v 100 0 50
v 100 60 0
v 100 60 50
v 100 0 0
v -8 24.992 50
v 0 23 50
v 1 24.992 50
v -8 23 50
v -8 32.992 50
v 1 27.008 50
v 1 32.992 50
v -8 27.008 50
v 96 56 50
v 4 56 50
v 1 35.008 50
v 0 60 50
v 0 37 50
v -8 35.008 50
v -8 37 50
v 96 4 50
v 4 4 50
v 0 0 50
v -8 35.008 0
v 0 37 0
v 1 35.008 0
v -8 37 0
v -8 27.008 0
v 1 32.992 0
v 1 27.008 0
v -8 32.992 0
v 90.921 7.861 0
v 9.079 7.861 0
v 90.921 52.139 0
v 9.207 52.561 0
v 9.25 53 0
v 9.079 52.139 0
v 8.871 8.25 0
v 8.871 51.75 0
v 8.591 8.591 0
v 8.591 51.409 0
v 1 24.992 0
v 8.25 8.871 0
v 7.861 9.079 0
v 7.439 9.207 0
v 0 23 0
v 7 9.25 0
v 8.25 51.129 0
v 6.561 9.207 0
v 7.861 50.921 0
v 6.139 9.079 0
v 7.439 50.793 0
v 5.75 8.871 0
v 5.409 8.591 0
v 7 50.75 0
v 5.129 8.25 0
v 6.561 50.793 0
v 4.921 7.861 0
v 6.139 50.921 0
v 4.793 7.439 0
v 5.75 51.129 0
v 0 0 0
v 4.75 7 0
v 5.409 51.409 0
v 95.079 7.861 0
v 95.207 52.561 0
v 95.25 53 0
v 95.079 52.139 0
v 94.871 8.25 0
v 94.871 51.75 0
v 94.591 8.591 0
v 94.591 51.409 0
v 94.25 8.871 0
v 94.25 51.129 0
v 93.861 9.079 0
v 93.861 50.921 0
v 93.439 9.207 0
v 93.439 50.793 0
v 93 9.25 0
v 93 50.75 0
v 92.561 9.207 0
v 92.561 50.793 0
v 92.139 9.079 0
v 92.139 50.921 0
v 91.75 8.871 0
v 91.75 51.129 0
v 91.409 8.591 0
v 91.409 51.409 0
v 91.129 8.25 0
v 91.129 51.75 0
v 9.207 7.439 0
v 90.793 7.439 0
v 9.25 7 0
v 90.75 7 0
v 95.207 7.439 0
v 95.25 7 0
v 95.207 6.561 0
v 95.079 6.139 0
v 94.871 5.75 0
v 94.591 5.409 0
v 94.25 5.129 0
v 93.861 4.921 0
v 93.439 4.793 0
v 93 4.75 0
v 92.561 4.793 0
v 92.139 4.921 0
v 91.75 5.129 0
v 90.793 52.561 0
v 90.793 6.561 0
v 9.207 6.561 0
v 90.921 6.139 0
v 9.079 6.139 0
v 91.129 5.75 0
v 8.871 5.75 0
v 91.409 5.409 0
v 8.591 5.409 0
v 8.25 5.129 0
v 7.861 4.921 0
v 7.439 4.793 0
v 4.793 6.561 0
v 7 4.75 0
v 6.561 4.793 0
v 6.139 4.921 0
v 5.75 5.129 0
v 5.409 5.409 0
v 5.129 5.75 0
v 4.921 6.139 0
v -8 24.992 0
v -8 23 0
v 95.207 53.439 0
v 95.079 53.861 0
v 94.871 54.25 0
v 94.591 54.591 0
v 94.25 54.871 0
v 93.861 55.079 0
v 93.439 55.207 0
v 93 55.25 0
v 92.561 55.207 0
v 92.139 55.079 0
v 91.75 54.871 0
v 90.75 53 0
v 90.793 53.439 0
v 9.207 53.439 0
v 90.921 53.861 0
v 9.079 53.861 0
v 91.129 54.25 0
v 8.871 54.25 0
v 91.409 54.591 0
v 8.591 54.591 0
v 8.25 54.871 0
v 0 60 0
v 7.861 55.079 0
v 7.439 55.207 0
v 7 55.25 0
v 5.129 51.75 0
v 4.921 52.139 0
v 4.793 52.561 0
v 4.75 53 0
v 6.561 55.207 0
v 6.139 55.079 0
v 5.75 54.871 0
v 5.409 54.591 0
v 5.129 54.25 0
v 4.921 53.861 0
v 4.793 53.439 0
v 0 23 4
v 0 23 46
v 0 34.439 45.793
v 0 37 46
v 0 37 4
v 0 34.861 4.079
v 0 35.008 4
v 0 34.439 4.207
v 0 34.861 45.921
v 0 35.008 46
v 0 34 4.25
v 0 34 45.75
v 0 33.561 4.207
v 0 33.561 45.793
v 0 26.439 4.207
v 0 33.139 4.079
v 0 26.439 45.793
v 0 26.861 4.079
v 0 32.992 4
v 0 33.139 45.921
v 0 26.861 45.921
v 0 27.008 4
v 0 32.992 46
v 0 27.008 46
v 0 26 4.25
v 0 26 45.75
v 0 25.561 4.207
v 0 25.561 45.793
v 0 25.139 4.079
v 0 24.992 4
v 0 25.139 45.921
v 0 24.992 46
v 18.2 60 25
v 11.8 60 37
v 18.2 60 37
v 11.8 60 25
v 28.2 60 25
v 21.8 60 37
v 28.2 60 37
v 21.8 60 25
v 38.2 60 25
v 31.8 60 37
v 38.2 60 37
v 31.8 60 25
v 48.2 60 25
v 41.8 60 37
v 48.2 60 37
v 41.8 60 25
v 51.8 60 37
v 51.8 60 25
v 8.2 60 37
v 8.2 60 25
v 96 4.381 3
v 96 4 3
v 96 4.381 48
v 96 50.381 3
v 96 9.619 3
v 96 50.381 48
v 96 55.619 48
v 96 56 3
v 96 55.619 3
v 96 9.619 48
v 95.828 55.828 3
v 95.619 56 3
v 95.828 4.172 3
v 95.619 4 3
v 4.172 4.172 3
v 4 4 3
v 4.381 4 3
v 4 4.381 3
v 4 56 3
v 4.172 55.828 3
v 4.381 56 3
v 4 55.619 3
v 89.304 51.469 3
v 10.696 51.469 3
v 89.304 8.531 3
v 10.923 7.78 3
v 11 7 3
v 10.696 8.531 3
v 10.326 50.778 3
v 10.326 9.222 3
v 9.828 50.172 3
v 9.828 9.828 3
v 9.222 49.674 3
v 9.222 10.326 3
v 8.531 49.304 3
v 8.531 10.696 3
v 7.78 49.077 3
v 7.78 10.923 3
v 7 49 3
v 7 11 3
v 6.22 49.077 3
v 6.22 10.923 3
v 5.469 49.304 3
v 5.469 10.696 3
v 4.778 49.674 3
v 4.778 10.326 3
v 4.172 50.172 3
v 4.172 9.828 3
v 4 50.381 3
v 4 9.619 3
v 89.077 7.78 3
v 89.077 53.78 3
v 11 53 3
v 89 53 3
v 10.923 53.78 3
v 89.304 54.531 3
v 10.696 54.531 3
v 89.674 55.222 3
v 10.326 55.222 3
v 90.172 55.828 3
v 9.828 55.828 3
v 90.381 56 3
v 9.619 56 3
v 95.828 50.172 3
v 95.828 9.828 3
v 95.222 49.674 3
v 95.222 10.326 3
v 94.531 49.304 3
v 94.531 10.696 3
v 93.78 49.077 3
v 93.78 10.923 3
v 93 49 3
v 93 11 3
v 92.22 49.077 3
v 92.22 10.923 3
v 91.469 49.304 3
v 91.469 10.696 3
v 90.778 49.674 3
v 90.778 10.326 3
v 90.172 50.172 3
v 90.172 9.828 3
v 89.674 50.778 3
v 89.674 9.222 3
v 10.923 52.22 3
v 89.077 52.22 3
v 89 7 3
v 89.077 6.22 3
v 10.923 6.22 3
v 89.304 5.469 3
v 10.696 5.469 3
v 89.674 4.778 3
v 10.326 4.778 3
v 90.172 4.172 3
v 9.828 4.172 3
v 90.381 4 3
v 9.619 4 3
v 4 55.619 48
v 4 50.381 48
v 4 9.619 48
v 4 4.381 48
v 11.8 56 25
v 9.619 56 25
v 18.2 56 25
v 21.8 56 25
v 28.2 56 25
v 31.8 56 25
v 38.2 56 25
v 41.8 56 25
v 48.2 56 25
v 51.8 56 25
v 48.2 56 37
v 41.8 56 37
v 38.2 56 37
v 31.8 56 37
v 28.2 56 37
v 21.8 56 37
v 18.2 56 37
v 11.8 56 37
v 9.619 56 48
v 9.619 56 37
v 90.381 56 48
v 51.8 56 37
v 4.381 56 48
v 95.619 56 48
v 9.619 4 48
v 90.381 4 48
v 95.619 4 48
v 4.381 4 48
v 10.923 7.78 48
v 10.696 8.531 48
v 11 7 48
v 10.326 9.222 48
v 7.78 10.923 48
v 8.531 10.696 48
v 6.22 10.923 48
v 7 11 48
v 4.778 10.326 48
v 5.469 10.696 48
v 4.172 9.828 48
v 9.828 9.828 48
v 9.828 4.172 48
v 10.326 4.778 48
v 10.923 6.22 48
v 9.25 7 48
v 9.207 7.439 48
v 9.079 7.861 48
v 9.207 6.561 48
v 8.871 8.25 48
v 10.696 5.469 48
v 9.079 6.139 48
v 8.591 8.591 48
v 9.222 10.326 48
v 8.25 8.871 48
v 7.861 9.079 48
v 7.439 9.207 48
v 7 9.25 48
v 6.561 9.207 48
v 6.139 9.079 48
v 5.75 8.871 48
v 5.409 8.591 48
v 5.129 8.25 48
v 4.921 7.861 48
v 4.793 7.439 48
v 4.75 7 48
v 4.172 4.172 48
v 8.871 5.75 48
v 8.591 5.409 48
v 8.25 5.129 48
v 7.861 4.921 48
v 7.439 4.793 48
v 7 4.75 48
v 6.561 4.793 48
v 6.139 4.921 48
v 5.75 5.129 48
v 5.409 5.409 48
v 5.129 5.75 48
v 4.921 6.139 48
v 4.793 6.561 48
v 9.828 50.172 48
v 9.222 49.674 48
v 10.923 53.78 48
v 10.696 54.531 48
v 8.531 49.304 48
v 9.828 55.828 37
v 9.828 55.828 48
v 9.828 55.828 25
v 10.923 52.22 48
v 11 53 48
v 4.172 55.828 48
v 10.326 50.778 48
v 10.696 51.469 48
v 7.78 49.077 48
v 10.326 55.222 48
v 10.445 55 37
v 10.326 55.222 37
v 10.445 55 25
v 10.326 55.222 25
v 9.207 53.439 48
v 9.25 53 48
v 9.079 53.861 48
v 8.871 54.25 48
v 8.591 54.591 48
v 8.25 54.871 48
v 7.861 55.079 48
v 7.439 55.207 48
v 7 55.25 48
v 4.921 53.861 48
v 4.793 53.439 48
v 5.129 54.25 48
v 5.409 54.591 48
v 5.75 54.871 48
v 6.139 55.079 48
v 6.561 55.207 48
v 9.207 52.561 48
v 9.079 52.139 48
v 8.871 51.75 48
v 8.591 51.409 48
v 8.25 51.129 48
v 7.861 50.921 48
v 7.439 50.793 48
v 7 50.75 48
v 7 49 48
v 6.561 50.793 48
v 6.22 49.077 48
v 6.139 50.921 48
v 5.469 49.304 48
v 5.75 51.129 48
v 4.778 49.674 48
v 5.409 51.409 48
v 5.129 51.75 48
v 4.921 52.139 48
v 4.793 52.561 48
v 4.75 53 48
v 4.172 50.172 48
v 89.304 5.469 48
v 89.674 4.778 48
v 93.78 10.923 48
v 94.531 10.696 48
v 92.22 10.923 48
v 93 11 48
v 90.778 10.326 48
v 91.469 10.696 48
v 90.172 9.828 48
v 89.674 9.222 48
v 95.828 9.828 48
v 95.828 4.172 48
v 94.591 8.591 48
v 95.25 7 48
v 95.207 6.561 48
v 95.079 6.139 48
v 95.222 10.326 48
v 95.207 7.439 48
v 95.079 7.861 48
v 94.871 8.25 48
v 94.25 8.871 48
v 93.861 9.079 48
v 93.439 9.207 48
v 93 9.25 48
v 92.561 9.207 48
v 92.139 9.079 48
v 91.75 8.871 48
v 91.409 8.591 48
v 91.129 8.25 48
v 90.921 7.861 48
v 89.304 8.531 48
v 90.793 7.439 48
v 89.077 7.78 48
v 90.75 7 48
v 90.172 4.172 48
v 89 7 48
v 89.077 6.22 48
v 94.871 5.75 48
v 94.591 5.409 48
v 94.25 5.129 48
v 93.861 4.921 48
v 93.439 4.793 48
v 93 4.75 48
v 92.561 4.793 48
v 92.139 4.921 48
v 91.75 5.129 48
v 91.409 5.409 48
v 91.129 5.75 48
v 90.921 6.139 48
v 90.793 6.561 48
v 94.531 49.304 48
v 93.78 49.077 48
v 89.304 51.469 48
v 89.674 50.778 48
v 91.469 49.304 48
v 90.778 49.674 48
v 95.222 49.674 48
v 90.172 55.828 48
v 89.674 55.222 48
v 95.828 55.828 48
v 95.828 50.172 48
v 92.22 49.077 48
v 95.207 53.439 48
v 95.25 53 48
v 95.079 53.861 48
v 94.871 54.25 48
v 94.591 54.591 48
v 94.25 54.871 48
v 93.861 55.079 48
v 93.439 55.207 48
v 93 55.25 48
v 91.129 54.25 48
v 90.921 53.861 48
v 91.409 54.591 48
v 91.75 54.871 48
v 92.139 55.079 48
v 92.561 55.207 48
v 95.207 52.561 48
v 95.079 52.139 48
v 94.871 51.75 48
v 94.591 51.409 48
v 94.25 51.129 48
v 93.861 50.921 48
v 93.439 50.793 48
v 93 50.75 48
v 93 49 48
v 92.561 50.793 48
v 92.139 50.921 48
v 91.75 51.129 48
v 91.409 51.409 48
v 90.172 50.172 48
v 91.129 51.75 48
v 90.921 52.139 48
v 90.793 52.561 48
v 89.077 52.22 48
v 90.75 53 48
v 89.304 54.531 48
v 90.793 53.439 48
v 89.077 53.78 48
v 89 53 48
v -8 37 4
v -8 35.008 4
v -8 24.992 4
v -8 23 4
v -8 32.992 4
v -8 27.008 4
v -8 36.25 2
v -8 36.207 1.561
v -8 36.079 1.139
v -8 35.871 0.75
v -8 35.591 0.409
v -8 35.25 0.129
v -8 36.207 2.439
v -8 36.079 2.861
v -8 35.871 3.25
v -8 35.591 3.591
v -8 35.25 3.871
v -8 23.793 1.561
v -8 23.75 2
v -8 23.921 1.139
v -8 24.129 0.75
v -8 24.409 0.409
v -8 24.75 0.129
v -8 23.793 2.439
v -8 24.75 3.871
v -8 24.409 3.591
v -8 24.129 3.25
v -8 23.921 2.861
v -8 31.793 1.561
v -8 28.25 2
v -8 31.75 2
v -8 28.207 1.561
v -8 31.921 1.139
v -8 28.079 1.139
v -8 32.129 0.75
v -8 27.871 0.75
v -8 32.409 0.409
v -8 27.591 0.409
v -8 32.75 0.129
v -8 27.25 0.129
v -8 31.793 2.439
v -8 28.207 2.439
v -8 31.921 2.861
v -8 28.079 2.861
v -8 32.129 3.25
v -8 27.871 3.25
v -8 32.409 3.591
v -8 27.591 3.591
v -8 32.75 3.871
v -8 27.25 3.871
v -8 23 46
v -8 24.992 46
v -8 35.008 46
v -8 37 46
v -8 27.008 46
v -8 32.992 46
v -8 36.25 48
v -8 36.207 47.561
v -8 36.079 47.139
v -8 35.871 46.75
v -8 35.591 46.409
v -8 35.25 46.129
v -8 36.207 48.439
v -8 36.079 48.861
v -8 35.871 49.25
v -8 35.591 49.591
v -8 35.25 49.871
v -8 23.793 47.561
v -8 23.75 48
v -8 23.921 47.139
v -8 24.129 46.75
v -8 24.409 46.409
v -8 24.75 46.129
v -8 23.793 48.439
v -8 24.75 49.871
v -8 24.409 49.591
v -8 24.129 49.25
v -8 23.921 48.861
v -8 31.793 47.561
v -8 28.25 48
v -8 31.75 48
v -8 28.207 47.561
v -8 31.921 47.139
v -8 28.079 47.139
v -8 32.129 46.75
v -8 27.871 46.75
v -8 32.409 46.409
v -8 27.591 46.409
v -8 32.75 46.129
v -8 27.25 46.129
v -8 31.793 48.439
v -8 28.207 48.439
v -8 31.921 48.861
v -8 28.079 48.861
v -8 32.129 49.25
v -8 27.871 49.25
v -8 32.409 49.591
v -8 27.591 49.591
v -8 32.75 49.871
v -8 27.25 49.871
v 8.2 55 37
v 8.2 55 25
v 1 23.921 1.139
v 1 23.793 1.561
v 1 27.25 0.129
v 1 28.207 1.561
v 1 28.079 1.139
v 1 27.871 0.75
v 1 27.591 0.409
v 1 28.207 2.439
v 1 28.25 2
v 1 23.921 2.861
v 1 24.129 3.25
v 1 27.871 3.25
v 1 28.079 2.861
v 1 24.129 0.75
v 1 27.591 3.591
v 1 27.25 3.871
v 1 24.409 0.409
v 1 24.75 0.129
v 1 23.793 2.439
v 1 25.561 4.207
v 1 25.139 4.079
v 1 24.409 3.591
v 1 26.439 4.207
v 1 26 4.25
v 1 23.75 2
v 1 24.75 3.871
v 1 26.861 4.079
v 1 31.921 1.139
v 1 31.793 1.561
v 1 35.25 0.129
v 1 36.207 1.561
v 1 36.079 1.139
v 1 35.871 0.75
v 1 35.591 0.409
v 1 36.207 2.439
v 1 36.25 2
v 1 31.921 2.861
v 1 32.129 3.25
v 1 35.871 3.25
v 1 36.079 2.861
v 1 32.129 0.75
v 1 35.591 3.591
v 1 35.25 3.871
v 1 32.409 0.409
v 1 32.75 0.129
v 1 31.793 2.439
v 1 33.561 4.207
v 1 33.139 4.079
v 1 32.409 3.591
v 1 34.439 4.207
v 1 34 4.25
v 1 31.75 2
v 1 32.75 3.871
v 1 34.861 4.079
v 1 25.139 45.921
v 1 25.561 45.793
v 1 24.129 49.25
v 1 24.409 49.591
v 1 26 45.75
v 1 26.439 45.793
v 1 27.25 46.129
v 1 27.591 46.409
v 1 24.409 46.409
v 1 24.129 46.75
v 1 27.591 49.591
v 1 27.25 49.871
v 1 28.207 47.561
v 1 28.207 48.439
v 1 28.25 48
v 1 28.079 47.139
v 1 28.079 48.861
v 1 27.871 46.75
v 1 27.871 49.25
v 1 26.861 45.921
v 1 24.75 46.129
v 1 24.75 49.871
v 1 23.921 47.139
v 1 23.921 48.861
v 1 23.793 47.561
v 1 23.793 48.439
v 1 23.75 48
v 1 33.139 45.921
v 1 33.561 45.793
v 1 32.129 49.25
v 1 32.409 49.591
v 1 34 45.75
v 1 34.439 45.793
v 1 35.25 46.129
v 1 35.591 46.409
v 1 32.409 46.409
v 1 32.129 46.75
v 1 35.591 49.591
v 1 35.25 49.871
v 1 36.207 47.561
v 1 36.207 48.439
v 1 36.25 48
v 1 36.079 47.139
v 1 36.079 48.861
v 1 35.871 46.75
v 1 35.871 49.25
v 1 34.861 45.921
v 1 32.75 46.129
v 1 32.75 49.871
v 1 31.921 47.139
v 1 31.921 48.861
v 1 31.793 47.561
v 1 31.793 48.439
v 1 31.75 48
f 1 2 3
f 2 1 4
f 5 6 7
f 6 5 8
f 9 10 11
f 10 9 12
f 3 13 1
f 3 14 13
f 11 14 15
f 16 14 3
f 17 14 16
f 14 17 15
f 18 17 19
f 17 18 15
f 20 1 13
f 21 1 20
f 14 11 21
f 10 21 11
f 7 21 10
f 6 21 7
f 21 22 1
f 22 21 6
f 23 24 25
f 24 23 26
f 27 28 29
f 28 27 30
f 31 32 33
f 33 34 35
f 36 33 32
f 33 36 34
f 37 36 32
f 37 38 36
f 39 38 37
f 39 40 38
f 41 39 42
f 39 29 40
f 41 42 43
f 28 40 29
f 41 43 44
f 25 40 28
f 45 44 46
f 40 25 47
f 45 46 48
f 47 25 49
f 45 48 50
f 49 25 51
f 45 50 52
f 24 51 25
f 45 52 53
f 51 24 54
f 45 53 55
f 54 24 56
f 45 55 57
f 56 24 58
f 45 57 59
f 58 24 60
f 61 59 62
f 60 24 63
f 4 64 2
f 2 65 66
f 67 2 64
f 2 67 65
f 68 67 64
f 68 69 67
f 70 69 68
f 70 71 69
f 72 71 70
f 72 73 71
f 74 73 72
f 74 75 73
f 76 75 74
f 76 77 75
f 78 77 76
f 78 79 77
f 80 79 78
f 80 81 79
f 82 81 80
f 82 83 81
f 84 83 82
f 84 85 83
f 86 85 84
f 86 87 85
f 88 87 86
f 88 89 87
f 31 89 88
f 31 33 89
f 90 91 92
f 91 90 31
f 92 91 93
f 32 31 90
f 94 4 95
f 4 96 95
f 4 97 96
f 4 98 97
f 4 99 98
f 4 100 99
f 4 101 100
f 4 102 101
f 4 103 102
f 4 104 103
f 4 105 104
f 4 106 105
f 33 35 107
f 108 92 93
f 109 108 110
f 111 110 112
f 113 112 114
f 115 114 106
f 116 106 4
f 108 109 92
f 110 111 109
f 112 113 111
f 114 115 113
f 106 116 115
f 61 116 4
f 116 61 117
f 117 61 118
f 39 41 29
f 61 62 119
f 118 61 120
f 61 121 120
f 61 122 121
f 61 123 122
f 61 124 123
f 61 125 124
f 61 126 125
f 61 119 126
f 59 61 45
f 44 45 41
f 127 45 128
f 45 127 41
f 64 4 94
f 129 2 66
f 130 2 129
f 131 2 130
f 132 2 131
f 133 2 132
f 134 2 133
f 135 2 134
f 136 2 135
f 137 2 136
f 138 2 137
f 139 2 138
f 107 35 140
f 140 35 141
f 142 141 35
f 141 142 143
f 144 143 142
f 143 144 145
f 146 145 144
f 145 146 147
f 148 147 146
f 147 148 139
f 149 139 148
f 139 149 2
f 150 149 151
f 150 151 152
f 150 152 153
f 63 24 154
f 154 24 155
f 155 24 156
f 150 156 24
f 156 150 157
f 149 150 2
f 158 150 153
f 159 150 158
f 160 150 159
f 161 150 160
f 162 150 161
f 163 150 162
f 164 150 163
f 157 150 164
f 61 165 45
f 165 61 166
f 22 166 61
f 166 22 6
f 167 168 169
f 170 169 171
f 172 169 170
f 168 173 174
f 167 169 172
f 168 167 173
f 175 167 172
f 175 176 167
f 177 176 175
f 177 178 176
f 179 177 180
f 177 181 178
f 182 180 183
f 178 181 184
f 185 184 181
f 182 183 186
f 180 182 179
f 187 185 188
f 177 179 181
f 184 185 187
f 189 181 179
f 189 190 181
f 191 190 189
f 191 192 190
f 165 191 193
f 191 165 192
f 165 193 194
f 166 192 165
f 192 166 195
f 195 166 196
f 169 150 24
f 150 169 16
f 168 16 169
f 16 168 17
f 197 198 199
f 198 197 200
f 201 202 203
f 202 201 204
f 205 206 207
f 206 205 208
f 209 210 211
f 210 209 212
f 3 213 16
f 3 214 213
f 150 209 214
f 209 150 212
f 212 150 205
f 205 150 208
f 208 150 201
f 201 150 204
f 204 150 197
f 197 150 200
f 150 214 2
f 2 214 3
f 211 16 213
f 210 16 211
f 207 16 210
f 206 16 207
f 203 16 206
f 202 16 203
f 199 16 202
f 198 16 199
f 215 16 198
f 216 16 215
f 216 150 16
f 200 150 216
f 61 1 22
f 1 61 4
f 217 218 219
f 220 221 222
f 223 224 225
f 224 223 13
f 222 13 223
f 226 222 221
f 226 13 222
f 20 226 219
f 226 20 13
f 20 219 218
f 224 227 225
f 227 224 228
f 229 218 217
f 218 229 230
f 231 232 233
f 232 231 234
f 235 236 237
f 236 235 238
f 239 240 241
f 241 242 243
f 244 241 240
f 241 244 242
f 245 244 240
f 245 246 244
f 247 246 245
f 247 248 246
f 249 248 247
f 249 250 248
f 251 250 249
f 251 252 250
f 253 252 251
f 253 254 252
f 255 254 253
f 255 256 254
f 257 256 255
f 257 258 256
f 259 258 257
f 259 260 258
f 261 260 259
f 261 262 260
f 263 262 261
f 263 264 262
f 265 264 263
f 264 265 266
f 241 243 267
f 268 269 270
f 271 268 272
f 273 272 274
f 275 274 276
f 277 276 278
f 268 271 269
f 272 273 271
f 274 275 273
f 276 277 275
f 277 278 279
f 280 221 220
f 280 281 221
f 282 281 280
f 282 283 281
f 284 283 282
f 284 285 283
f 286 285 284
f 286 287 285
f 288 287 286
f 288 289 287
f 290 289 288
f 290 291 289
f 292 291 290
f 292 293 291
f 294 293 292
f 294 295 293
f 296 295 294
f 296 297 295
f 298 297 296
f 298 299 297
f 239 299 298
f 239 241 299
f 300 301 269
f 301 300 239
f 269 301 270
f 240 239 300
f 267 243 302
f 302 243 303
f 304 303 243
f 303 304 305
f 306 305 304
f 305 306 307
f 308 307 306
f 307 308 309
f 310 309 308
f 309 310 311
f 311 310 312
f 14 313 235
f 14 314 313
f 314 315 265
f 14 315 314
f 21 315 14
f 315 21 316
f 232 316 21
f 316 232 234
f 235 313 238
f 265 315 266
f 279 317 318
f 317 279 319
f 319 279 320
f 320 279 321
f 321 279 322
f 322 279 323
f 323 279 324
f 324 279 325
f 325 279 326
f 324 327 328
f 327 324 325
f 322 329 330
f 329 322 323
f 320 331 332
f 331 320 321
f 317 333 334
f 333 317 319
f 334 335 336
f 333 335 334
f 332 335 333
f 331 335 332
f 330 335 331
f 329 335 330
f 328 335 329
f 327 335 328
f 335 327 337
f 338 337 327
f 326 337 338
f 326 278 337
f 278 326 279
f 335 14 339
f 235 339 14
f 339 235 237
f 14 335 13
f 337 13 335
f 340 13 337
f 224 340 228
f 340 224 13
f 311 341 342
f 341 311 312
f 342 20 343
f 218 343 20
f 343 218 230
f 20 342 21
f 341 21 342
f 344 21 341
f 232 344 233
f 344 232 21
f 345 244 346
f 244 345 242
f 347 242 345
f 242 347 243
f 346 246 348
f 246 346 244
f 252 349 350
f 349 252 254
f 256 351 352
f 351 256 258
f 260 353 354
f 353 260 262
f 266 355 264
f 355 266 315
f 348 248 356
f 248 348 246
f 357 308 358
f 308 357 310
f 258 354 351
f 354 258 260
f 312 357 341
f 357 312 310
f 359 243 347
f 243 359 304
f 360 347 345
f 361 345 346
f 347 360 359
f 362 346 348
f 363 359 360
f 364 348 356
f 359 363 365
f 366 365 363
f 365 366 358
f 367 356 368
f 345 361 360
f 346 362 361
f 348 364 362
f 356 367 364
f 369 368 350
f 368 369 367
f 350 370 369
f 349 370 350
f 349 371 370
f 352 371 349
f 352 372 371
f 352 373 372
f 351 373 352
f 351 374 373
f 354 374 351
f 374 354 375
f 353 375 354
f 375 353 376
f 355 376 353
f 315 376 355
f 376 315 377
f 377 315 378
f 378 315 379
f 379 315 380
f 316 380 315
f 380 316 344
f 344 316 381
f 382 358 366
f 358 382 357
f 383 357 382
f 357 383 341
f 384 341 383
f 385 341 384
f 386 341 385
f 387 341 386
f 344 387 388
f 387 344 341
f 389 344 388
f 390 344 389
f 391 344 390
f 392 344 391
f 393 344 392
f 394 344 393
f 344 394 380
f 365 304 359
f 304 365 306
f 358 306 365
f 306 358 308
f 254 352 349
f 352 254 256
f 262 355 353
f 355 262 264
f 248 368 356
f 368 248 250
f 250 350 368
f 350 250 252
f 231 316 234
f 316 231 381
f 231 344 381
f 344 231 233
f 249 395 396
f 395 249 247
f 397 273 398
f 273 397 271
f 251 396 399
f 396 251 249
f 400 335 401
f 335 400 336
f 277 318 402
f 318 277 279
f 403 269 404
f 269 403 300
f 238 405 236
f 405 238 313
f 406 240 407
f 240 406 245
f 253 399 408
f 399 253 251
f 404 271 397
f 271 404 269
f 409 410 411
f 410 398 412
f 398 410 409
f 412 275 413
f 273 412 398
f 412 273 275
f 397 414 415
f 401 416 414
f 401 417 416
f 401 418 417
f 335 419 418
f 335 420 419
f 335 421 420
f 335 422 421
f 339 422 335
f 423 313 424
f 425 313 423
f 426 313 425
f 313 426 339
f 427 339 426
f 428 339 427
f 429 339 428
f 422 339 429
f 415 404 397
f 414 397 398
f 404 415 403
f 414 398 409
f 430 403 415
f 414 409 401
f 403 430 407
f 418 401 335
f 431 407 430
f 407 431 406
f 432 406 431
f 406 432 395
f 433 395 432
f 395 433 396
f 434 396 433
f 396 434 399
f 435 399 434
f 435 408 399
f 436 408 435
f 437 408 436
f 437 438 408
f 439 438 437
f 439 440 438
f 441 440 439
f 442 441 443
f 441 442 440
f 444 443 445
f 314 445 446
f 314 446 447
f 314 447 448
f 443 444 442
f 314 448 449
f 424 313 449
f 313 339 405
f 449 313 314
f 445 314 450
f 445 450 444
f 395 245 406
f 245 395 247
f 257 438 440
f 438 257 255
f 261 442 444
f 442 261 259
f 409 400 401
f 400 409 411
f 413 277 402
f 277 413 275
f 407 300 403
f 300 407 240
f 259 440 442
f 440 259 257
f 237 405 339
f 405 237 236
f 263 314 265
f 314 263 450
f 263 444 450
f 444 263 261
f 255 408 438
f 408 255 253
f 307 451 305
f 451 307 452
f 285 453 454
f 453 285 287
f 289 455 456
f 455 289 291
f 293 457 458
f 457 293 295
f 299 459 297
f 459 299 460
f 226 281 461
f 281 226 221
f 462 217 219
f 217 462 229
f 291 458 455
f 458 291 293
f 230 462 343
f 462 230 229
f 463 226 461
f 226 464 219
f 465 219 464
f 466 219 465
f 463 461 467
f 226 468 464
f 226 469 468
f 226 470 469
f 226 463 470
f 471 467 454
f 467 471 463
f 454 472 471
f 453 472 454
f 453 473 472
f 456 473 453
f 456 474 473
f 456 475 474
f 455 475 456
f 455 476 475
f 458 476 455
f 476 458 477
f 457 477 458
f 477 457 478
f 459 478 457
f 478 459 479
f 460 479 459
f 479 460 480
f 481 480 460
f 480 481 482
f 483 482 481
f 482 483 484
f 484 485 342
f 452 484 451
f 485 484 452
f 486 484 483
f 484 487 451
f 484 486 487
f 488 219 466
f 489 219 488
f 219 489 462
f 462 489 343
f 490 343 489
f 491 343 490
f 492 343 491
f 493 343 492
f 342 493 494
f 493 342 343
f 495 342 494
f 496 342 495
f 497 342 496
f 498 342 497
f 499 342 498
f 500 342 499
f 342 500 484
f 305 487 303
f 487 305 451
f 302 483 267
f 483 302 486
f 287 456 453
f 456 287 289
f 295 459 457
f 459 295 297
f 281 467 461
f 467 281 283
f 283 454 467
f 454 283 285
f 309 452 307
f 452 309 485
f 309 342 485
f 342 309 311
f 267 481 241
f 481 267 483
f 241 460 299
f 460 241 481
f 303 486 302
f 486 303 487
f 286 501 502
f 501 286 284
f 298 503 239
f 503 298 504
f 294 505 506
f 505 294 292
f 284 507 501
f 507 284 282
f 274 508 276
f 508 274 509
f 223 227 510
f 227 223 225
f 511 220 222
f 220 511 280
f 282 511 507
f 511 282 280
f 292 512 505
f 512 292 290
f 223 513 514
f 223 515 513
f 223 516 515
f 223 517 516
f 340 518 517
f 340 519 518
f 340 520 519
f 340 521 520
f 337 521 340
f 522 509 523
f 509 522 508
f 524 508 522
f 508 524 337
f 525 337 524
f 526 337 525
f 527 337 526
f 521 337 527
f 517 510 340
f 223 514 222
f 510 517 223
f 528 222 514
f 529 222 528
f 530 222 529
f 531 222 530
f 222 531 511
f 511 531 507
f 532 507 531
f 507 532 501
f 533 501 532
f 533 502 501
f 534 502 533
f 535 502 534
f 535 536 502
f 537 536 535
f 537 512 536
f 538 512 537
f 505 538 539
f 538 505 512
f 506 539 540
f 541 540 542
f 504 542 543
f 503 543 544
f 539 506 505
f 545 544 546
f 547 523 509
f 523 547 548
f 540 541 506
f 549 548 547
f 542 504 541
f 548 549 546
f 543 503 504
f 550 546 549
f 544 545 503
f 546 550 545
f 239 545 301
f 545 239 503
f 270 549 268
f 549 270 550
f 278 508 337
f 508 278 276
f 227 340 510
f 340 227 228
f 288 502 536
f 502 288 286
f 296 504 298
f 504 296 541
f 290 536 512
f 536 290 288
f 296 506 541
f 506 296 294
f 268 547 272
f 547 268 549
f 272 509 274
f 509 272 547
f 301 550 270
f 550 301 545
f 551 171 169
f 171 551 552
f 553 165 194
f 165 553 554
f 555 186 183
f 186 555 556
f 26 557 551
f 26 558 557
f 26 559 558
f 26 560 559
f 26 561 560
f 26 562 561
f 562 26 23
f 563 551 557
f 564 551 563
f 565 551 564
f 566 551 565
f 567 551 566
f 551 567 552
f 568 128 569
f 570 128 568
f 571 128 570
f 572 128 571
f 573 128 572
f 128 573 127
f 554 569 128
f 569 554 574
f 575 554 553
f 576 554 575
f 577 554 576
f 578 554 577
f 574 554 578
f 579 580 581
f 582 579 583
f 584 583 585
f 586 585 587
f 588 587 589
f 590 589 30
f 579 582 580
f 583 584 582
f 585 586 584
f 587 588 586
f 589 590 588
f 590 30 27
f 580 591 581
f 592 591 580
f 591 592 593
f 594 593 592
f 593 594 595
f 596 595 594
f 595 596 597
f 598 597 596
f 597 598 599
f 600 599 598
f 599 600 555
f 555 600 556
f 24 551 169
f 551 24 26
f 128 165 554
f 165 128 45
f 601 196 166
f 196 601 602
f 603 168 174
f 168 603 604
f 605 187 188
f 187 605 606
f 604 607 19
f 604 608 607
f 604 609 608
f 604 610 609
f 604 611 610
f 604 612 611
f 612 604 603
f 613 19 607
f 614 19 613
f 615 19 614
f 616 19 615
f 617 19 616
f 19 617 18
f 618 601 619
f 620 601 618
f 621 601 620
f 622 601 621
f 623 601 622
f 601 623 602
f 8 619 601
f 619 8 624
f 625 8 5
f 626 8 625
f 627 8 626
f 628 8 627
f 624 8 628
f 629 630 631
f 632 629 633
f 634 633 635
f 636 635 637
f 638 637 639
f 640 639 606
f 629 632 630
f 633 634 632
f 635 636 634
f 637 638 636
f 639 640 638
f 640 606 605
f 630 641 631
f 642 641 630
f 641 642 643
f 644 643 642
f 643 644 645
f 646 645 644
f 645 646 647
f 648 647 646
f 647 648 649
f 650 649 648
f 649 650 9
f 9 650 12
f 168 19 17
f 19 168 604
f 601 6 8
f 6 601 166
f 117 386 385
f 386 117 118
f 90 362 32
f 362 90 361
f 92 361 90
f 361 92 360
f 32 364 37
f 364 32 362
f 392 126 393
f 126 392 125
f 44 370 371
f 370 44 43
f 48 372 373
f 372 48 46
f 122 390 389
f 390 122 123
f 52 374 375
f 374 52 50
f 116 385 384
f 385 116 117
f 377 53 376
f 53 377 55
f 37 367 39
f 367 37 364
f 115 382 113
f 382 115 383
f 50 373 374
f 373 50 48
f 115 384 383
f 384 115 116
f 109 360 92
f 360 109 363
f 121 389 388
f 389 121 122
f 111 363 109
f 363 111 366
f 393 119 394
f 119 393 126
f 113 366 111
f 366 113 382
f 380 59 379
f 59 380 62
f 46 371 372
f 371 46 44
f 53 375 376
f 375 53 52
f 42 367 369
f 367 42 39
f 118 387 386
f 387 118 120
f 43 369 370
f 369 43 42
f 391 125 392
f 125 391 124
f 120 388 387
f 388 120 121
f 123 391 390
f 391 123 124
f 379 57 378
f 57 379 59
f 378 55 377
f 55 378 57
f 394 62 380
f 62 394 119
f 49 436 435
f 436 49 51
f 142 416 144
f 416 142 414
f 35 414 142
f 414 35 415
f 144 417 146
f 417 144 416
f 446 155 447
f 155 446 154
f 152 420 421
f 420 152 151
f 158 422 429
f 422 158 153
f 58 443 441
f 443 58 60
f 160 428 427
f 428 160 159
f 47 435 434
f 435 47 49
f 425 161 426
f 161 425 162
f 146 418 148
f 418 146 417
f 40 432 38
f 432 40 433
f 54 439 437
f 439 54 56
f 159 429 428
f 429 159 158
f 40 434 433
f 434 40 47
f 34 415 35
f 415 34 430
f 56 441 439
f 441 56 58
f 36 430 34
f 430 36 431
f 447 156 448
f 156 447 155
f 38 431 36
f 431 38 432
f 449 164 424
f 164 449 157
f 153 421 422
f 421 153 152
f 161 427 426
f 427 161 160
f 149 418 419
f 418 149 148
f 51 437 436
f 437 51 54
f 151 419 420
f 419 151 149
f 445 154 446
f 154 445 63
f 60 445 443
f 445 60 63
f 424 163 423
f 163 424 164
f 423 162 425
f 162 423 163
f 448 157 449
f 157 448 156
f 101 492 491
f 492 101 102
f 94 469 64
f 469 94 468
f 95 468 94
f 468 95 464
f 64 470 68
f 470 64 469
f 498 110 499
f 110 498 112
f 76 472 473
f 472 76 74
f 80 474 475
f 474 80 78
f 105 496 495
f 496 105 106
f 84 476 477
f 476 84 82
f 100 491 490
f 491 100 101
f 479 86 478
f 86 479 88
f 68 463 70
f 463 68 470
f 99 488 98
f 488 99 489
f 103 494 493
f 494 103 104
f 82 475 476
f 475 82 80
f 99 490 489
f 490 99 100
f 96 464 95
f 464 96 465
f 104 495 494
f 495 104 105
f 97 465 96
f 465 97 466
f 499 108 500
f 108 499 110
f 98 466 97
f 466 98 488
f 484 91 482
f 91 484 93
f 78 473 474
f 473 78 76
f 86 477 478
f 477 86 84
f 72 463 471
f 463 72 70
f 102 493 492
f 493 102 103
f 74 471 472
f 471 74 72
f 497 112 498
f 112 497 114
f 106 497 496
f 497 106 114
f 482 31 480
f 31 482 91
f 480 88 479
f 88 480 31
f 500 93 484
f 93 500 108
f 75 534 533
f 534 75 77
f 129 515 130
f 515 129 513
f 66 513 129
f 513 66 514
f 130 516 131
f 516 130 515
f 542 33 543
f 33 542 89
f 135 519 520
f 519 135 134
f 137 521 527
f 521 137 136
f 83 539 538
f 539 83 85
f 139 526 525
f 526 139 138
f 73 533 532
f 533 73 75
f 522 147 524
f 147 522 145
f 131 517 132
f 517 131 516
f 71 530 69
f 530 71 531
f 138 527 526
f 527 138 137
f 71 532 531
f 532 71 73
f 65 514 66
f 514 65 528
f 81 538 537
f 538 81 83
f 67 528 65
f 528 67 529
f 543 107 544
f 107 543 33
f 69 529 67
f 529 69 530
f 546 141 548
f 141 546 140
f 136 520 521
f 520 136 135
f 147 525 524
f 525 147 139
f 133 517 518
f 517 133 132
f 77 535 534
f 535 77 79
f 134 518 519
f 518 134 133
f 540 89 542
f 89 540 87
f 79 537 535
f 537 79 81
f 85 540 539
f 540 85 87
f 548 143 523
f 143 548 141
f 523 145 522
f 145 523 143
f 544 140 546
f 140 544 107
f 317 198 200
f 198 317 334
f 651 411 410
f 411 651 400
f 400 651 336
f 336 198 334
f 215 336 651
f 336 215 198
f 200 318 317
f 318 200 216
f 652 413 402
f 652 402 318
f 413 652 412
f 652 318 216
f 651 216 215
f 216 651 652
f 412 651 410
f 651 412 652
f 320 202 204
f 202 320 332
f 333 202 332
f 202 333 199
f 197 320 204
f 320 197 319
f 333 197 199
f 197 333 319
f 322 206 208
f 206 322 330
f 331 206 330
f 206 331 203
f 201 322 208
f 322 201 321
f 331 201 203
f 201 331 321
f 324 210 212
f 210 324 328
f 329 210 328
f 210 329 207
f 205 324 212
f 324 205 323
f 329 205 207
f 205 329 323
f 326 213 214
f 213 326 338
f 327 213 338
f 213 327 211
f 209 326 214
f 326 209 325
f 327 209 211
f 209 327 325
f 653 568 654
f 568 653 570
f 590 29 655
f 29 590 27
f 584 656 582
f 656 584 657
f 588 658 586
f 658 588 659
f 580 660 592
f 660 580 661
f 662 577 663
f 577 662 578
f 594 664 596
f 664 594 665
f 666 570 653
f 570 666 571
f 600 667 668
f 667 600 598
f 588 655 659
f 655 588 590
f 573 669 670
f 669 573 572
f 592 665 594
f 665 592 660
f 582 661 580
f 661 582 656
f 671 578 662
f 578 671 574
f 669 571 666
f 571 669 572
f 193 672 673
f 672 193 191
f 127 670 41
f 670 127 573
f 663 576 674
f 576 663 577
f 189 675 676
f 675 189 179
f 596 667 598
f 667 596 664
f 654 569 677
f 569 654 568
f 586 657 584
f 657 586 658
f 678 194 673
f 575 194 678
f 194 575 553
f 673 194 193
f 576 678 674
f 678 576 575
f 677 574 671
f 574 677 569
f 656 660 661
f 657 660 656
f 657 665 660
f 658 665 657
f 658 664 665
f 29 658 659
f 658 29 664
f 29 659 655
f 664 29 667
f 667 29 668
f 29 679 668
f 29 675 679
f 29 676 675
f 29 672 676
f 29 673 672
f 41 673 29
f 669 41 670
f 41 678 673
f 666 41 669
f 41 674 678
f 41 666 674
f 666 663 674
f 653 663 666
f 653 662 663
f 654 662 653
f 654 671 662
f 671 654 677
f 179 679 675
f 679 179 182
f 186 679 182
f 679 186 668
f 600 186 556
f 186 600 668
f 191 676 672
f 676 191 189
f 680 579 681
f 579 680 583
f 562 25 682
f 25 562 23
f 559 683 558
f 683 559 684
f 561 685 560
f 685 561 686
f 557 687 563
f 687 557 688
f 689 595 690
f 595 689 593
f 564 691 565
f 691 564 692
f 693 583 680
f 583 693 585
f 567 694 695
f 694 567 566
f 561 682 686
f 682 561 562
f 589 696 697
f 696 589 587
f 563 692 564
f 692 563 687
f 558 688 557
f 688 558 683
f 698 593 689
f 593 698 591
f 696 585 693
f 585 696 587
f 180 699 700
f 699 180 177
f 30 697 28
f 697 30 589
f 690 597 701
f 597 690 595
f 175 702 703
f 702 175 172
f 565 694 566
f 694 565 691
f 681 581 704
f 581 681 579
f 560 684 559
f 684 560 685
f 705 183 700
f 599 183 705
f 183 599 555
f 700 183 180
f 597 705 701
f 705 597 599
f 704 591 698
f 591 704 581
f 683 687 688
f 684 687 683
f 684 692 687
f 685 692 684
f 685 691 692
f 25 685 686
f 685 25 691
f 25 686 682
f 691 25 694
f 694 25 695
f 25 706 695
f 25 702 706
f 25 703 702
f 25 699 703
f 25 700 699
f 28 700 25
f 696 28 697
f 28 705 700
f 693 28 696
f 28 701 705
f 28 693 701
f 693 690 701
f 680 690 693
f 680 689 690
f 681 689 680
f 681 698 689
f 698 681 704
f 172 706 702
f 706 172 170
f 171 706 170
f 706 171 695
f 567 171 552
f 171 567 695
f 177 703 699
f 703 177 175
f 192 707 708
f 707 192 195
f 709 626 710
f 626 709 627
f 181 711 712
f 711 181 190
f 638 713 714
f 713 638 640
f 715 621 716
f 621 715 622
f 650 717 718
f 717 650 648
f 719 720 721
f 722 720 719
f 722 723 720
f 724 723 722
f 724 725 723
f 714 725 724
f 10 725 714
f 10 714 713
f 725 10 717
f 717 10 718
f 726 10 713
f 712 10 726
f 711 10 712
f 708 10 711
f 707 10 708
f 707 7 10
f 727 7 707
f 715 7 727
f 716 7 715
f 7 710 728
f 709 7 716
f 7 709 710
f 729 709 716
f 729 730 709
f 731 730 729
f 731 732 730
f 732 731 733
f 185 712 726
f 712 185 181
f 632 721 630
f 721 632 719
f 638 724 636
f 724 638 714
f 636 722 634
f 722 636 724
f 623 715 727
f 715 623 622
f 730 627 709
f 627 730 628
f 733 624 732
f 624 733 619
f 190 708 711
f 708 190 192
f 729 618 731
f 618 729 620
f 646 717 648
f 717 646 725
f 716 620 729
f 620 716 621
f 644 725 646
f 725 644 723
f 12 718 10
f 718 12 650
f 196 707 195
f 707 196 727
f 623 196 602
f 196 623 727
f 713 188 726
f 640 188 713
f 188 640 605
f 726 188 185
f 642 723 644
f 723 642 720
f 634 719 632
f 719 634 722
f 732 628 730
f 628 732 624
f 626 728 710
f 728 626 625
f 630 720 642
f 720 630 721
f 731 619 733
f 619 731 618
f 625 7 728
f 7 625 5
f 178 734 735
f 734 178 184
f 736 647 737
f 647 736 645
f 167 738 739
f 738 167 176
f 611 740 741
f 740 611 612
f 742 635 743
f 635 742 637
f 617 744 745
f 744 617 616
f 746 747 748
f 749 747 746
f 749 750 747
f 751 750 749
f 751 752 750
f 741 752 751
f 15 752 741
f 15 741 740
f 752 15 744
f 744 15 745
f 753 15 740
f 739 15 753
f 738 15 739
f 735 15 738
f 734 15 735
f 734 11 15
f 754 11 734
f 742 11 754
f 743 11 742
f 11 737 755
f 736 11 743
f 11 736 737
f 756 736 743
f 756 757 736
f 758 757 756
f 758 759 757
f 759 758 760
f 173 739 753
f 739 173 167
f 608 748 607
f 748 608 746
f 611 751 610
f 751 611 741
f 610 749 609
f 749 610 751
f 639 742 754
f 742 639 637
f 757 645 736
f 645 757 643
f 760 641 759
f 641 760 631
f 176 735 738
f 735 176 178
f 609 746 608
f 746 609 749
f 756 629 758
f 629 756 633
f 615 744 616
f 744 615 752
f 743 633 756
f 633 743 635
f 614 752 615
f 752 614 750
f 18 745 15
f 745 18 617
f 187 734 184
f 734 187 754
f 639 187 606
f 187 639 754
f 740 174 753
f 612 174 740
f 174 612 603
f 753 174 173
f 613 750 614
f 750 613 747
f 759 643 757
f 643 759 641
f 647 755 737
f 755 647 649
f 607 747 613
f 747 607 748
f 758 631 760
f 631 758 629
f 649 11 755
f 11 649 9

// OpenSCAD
$fn = 32;

// ----------------------------------------------------------------------
// Enclosure body: 100 x 60 x 50 mm, wall 4 mm
// ----------------------------------------------------------------------

// --- parameters (mm) ---
length = 100;             // outside length, X
width = 60;               // outside width, Y
height = 50;              // outside height, Z
wall = 4;                 // side wall thickness
floor_t = 3;              // floor thickness
boss_d = 8;               // corner boss diameter
boss_h = 45;              // corner boss height above the floor
boss_hole_d = 4.5;        // lid screw clearance in the boss
boss_lip = 7;             // boss centre inset from the corner
ear_w = 14;               // mounting ear width
ear_t = 4;                // mounting ear thickness
ear_ext = 8;              // mounting ear reach
ear_hole_d = 4.5;         // mounting ear drills
vent_slots = 5;           // vent slots in the long wall
vent_w = 3.6;             // vent slot width
vent_h = 12;              // vent slot height
vent_pitch = 10;          // vent slot pitch
vent_z = 25;              // vent slot sill height

module shell() {
  difference() {
    cube([length, width, height]);
    /* hollow, open at the top */
    translate([wall, wall, floor_t])
      cube([length - 2 * wall, width - 2 * wall, height]);
  }
}

module bosses() {
  /* corner bosses, sunk 1 mm into the floor */
  for (sx = [0, 1]) for (sy = [0, 1])
    translate([sx * (length - 2 * boss_lip) + boss_lip, sy * (width - 2 * boss_lip) + boss_lip, floor_t - 1])
      cylinder(h = boss_h + 1, d = boss_d);
}

module ears() {
  /* mounting ears on the short walls, sunk into the wall */
  for (sz = [0, 1])
    translate([-ear_ext, width / 2 - ear_w / 2, sz * (height - ear_t)])
      cube([ear_ext + 2.5, ear_w, ear_t]);
}

difference() {
  union() {
    shell();
    bosses();
    ears();
  }
  /* boss screw holes */
  for (sx = [0, 1]) for (sy = [0, 1])
    translate([sx * (length - 2 * boss_lip) + boss_lip, sy * (width - 2 * boss_lip) + boss_lip, -1]) cylinder(h = floor_t + boss_h + 2, d = boss_hole_d);
  /* vent grille in the +Y wall */
  for (i = [0 : vent_slots - 1]) translate([vent_pitch * (i + 1) - vent_w / 2, width - wall - 1, vent_z]) cube([vent_w, wall + 2, vent_h]);
  for (sz = [0, 1]) for (sx = [0, 1]) translate([-ear_ext - 1, width / 2 + (2 * sx - 1) * (ear_w / 2 - 3), sz * (height - ear_t) + ear_t / 2]) rotate([0, 90, 0]) cylinder(h = ear_ext + 2, d = ear_hole_d);
}
